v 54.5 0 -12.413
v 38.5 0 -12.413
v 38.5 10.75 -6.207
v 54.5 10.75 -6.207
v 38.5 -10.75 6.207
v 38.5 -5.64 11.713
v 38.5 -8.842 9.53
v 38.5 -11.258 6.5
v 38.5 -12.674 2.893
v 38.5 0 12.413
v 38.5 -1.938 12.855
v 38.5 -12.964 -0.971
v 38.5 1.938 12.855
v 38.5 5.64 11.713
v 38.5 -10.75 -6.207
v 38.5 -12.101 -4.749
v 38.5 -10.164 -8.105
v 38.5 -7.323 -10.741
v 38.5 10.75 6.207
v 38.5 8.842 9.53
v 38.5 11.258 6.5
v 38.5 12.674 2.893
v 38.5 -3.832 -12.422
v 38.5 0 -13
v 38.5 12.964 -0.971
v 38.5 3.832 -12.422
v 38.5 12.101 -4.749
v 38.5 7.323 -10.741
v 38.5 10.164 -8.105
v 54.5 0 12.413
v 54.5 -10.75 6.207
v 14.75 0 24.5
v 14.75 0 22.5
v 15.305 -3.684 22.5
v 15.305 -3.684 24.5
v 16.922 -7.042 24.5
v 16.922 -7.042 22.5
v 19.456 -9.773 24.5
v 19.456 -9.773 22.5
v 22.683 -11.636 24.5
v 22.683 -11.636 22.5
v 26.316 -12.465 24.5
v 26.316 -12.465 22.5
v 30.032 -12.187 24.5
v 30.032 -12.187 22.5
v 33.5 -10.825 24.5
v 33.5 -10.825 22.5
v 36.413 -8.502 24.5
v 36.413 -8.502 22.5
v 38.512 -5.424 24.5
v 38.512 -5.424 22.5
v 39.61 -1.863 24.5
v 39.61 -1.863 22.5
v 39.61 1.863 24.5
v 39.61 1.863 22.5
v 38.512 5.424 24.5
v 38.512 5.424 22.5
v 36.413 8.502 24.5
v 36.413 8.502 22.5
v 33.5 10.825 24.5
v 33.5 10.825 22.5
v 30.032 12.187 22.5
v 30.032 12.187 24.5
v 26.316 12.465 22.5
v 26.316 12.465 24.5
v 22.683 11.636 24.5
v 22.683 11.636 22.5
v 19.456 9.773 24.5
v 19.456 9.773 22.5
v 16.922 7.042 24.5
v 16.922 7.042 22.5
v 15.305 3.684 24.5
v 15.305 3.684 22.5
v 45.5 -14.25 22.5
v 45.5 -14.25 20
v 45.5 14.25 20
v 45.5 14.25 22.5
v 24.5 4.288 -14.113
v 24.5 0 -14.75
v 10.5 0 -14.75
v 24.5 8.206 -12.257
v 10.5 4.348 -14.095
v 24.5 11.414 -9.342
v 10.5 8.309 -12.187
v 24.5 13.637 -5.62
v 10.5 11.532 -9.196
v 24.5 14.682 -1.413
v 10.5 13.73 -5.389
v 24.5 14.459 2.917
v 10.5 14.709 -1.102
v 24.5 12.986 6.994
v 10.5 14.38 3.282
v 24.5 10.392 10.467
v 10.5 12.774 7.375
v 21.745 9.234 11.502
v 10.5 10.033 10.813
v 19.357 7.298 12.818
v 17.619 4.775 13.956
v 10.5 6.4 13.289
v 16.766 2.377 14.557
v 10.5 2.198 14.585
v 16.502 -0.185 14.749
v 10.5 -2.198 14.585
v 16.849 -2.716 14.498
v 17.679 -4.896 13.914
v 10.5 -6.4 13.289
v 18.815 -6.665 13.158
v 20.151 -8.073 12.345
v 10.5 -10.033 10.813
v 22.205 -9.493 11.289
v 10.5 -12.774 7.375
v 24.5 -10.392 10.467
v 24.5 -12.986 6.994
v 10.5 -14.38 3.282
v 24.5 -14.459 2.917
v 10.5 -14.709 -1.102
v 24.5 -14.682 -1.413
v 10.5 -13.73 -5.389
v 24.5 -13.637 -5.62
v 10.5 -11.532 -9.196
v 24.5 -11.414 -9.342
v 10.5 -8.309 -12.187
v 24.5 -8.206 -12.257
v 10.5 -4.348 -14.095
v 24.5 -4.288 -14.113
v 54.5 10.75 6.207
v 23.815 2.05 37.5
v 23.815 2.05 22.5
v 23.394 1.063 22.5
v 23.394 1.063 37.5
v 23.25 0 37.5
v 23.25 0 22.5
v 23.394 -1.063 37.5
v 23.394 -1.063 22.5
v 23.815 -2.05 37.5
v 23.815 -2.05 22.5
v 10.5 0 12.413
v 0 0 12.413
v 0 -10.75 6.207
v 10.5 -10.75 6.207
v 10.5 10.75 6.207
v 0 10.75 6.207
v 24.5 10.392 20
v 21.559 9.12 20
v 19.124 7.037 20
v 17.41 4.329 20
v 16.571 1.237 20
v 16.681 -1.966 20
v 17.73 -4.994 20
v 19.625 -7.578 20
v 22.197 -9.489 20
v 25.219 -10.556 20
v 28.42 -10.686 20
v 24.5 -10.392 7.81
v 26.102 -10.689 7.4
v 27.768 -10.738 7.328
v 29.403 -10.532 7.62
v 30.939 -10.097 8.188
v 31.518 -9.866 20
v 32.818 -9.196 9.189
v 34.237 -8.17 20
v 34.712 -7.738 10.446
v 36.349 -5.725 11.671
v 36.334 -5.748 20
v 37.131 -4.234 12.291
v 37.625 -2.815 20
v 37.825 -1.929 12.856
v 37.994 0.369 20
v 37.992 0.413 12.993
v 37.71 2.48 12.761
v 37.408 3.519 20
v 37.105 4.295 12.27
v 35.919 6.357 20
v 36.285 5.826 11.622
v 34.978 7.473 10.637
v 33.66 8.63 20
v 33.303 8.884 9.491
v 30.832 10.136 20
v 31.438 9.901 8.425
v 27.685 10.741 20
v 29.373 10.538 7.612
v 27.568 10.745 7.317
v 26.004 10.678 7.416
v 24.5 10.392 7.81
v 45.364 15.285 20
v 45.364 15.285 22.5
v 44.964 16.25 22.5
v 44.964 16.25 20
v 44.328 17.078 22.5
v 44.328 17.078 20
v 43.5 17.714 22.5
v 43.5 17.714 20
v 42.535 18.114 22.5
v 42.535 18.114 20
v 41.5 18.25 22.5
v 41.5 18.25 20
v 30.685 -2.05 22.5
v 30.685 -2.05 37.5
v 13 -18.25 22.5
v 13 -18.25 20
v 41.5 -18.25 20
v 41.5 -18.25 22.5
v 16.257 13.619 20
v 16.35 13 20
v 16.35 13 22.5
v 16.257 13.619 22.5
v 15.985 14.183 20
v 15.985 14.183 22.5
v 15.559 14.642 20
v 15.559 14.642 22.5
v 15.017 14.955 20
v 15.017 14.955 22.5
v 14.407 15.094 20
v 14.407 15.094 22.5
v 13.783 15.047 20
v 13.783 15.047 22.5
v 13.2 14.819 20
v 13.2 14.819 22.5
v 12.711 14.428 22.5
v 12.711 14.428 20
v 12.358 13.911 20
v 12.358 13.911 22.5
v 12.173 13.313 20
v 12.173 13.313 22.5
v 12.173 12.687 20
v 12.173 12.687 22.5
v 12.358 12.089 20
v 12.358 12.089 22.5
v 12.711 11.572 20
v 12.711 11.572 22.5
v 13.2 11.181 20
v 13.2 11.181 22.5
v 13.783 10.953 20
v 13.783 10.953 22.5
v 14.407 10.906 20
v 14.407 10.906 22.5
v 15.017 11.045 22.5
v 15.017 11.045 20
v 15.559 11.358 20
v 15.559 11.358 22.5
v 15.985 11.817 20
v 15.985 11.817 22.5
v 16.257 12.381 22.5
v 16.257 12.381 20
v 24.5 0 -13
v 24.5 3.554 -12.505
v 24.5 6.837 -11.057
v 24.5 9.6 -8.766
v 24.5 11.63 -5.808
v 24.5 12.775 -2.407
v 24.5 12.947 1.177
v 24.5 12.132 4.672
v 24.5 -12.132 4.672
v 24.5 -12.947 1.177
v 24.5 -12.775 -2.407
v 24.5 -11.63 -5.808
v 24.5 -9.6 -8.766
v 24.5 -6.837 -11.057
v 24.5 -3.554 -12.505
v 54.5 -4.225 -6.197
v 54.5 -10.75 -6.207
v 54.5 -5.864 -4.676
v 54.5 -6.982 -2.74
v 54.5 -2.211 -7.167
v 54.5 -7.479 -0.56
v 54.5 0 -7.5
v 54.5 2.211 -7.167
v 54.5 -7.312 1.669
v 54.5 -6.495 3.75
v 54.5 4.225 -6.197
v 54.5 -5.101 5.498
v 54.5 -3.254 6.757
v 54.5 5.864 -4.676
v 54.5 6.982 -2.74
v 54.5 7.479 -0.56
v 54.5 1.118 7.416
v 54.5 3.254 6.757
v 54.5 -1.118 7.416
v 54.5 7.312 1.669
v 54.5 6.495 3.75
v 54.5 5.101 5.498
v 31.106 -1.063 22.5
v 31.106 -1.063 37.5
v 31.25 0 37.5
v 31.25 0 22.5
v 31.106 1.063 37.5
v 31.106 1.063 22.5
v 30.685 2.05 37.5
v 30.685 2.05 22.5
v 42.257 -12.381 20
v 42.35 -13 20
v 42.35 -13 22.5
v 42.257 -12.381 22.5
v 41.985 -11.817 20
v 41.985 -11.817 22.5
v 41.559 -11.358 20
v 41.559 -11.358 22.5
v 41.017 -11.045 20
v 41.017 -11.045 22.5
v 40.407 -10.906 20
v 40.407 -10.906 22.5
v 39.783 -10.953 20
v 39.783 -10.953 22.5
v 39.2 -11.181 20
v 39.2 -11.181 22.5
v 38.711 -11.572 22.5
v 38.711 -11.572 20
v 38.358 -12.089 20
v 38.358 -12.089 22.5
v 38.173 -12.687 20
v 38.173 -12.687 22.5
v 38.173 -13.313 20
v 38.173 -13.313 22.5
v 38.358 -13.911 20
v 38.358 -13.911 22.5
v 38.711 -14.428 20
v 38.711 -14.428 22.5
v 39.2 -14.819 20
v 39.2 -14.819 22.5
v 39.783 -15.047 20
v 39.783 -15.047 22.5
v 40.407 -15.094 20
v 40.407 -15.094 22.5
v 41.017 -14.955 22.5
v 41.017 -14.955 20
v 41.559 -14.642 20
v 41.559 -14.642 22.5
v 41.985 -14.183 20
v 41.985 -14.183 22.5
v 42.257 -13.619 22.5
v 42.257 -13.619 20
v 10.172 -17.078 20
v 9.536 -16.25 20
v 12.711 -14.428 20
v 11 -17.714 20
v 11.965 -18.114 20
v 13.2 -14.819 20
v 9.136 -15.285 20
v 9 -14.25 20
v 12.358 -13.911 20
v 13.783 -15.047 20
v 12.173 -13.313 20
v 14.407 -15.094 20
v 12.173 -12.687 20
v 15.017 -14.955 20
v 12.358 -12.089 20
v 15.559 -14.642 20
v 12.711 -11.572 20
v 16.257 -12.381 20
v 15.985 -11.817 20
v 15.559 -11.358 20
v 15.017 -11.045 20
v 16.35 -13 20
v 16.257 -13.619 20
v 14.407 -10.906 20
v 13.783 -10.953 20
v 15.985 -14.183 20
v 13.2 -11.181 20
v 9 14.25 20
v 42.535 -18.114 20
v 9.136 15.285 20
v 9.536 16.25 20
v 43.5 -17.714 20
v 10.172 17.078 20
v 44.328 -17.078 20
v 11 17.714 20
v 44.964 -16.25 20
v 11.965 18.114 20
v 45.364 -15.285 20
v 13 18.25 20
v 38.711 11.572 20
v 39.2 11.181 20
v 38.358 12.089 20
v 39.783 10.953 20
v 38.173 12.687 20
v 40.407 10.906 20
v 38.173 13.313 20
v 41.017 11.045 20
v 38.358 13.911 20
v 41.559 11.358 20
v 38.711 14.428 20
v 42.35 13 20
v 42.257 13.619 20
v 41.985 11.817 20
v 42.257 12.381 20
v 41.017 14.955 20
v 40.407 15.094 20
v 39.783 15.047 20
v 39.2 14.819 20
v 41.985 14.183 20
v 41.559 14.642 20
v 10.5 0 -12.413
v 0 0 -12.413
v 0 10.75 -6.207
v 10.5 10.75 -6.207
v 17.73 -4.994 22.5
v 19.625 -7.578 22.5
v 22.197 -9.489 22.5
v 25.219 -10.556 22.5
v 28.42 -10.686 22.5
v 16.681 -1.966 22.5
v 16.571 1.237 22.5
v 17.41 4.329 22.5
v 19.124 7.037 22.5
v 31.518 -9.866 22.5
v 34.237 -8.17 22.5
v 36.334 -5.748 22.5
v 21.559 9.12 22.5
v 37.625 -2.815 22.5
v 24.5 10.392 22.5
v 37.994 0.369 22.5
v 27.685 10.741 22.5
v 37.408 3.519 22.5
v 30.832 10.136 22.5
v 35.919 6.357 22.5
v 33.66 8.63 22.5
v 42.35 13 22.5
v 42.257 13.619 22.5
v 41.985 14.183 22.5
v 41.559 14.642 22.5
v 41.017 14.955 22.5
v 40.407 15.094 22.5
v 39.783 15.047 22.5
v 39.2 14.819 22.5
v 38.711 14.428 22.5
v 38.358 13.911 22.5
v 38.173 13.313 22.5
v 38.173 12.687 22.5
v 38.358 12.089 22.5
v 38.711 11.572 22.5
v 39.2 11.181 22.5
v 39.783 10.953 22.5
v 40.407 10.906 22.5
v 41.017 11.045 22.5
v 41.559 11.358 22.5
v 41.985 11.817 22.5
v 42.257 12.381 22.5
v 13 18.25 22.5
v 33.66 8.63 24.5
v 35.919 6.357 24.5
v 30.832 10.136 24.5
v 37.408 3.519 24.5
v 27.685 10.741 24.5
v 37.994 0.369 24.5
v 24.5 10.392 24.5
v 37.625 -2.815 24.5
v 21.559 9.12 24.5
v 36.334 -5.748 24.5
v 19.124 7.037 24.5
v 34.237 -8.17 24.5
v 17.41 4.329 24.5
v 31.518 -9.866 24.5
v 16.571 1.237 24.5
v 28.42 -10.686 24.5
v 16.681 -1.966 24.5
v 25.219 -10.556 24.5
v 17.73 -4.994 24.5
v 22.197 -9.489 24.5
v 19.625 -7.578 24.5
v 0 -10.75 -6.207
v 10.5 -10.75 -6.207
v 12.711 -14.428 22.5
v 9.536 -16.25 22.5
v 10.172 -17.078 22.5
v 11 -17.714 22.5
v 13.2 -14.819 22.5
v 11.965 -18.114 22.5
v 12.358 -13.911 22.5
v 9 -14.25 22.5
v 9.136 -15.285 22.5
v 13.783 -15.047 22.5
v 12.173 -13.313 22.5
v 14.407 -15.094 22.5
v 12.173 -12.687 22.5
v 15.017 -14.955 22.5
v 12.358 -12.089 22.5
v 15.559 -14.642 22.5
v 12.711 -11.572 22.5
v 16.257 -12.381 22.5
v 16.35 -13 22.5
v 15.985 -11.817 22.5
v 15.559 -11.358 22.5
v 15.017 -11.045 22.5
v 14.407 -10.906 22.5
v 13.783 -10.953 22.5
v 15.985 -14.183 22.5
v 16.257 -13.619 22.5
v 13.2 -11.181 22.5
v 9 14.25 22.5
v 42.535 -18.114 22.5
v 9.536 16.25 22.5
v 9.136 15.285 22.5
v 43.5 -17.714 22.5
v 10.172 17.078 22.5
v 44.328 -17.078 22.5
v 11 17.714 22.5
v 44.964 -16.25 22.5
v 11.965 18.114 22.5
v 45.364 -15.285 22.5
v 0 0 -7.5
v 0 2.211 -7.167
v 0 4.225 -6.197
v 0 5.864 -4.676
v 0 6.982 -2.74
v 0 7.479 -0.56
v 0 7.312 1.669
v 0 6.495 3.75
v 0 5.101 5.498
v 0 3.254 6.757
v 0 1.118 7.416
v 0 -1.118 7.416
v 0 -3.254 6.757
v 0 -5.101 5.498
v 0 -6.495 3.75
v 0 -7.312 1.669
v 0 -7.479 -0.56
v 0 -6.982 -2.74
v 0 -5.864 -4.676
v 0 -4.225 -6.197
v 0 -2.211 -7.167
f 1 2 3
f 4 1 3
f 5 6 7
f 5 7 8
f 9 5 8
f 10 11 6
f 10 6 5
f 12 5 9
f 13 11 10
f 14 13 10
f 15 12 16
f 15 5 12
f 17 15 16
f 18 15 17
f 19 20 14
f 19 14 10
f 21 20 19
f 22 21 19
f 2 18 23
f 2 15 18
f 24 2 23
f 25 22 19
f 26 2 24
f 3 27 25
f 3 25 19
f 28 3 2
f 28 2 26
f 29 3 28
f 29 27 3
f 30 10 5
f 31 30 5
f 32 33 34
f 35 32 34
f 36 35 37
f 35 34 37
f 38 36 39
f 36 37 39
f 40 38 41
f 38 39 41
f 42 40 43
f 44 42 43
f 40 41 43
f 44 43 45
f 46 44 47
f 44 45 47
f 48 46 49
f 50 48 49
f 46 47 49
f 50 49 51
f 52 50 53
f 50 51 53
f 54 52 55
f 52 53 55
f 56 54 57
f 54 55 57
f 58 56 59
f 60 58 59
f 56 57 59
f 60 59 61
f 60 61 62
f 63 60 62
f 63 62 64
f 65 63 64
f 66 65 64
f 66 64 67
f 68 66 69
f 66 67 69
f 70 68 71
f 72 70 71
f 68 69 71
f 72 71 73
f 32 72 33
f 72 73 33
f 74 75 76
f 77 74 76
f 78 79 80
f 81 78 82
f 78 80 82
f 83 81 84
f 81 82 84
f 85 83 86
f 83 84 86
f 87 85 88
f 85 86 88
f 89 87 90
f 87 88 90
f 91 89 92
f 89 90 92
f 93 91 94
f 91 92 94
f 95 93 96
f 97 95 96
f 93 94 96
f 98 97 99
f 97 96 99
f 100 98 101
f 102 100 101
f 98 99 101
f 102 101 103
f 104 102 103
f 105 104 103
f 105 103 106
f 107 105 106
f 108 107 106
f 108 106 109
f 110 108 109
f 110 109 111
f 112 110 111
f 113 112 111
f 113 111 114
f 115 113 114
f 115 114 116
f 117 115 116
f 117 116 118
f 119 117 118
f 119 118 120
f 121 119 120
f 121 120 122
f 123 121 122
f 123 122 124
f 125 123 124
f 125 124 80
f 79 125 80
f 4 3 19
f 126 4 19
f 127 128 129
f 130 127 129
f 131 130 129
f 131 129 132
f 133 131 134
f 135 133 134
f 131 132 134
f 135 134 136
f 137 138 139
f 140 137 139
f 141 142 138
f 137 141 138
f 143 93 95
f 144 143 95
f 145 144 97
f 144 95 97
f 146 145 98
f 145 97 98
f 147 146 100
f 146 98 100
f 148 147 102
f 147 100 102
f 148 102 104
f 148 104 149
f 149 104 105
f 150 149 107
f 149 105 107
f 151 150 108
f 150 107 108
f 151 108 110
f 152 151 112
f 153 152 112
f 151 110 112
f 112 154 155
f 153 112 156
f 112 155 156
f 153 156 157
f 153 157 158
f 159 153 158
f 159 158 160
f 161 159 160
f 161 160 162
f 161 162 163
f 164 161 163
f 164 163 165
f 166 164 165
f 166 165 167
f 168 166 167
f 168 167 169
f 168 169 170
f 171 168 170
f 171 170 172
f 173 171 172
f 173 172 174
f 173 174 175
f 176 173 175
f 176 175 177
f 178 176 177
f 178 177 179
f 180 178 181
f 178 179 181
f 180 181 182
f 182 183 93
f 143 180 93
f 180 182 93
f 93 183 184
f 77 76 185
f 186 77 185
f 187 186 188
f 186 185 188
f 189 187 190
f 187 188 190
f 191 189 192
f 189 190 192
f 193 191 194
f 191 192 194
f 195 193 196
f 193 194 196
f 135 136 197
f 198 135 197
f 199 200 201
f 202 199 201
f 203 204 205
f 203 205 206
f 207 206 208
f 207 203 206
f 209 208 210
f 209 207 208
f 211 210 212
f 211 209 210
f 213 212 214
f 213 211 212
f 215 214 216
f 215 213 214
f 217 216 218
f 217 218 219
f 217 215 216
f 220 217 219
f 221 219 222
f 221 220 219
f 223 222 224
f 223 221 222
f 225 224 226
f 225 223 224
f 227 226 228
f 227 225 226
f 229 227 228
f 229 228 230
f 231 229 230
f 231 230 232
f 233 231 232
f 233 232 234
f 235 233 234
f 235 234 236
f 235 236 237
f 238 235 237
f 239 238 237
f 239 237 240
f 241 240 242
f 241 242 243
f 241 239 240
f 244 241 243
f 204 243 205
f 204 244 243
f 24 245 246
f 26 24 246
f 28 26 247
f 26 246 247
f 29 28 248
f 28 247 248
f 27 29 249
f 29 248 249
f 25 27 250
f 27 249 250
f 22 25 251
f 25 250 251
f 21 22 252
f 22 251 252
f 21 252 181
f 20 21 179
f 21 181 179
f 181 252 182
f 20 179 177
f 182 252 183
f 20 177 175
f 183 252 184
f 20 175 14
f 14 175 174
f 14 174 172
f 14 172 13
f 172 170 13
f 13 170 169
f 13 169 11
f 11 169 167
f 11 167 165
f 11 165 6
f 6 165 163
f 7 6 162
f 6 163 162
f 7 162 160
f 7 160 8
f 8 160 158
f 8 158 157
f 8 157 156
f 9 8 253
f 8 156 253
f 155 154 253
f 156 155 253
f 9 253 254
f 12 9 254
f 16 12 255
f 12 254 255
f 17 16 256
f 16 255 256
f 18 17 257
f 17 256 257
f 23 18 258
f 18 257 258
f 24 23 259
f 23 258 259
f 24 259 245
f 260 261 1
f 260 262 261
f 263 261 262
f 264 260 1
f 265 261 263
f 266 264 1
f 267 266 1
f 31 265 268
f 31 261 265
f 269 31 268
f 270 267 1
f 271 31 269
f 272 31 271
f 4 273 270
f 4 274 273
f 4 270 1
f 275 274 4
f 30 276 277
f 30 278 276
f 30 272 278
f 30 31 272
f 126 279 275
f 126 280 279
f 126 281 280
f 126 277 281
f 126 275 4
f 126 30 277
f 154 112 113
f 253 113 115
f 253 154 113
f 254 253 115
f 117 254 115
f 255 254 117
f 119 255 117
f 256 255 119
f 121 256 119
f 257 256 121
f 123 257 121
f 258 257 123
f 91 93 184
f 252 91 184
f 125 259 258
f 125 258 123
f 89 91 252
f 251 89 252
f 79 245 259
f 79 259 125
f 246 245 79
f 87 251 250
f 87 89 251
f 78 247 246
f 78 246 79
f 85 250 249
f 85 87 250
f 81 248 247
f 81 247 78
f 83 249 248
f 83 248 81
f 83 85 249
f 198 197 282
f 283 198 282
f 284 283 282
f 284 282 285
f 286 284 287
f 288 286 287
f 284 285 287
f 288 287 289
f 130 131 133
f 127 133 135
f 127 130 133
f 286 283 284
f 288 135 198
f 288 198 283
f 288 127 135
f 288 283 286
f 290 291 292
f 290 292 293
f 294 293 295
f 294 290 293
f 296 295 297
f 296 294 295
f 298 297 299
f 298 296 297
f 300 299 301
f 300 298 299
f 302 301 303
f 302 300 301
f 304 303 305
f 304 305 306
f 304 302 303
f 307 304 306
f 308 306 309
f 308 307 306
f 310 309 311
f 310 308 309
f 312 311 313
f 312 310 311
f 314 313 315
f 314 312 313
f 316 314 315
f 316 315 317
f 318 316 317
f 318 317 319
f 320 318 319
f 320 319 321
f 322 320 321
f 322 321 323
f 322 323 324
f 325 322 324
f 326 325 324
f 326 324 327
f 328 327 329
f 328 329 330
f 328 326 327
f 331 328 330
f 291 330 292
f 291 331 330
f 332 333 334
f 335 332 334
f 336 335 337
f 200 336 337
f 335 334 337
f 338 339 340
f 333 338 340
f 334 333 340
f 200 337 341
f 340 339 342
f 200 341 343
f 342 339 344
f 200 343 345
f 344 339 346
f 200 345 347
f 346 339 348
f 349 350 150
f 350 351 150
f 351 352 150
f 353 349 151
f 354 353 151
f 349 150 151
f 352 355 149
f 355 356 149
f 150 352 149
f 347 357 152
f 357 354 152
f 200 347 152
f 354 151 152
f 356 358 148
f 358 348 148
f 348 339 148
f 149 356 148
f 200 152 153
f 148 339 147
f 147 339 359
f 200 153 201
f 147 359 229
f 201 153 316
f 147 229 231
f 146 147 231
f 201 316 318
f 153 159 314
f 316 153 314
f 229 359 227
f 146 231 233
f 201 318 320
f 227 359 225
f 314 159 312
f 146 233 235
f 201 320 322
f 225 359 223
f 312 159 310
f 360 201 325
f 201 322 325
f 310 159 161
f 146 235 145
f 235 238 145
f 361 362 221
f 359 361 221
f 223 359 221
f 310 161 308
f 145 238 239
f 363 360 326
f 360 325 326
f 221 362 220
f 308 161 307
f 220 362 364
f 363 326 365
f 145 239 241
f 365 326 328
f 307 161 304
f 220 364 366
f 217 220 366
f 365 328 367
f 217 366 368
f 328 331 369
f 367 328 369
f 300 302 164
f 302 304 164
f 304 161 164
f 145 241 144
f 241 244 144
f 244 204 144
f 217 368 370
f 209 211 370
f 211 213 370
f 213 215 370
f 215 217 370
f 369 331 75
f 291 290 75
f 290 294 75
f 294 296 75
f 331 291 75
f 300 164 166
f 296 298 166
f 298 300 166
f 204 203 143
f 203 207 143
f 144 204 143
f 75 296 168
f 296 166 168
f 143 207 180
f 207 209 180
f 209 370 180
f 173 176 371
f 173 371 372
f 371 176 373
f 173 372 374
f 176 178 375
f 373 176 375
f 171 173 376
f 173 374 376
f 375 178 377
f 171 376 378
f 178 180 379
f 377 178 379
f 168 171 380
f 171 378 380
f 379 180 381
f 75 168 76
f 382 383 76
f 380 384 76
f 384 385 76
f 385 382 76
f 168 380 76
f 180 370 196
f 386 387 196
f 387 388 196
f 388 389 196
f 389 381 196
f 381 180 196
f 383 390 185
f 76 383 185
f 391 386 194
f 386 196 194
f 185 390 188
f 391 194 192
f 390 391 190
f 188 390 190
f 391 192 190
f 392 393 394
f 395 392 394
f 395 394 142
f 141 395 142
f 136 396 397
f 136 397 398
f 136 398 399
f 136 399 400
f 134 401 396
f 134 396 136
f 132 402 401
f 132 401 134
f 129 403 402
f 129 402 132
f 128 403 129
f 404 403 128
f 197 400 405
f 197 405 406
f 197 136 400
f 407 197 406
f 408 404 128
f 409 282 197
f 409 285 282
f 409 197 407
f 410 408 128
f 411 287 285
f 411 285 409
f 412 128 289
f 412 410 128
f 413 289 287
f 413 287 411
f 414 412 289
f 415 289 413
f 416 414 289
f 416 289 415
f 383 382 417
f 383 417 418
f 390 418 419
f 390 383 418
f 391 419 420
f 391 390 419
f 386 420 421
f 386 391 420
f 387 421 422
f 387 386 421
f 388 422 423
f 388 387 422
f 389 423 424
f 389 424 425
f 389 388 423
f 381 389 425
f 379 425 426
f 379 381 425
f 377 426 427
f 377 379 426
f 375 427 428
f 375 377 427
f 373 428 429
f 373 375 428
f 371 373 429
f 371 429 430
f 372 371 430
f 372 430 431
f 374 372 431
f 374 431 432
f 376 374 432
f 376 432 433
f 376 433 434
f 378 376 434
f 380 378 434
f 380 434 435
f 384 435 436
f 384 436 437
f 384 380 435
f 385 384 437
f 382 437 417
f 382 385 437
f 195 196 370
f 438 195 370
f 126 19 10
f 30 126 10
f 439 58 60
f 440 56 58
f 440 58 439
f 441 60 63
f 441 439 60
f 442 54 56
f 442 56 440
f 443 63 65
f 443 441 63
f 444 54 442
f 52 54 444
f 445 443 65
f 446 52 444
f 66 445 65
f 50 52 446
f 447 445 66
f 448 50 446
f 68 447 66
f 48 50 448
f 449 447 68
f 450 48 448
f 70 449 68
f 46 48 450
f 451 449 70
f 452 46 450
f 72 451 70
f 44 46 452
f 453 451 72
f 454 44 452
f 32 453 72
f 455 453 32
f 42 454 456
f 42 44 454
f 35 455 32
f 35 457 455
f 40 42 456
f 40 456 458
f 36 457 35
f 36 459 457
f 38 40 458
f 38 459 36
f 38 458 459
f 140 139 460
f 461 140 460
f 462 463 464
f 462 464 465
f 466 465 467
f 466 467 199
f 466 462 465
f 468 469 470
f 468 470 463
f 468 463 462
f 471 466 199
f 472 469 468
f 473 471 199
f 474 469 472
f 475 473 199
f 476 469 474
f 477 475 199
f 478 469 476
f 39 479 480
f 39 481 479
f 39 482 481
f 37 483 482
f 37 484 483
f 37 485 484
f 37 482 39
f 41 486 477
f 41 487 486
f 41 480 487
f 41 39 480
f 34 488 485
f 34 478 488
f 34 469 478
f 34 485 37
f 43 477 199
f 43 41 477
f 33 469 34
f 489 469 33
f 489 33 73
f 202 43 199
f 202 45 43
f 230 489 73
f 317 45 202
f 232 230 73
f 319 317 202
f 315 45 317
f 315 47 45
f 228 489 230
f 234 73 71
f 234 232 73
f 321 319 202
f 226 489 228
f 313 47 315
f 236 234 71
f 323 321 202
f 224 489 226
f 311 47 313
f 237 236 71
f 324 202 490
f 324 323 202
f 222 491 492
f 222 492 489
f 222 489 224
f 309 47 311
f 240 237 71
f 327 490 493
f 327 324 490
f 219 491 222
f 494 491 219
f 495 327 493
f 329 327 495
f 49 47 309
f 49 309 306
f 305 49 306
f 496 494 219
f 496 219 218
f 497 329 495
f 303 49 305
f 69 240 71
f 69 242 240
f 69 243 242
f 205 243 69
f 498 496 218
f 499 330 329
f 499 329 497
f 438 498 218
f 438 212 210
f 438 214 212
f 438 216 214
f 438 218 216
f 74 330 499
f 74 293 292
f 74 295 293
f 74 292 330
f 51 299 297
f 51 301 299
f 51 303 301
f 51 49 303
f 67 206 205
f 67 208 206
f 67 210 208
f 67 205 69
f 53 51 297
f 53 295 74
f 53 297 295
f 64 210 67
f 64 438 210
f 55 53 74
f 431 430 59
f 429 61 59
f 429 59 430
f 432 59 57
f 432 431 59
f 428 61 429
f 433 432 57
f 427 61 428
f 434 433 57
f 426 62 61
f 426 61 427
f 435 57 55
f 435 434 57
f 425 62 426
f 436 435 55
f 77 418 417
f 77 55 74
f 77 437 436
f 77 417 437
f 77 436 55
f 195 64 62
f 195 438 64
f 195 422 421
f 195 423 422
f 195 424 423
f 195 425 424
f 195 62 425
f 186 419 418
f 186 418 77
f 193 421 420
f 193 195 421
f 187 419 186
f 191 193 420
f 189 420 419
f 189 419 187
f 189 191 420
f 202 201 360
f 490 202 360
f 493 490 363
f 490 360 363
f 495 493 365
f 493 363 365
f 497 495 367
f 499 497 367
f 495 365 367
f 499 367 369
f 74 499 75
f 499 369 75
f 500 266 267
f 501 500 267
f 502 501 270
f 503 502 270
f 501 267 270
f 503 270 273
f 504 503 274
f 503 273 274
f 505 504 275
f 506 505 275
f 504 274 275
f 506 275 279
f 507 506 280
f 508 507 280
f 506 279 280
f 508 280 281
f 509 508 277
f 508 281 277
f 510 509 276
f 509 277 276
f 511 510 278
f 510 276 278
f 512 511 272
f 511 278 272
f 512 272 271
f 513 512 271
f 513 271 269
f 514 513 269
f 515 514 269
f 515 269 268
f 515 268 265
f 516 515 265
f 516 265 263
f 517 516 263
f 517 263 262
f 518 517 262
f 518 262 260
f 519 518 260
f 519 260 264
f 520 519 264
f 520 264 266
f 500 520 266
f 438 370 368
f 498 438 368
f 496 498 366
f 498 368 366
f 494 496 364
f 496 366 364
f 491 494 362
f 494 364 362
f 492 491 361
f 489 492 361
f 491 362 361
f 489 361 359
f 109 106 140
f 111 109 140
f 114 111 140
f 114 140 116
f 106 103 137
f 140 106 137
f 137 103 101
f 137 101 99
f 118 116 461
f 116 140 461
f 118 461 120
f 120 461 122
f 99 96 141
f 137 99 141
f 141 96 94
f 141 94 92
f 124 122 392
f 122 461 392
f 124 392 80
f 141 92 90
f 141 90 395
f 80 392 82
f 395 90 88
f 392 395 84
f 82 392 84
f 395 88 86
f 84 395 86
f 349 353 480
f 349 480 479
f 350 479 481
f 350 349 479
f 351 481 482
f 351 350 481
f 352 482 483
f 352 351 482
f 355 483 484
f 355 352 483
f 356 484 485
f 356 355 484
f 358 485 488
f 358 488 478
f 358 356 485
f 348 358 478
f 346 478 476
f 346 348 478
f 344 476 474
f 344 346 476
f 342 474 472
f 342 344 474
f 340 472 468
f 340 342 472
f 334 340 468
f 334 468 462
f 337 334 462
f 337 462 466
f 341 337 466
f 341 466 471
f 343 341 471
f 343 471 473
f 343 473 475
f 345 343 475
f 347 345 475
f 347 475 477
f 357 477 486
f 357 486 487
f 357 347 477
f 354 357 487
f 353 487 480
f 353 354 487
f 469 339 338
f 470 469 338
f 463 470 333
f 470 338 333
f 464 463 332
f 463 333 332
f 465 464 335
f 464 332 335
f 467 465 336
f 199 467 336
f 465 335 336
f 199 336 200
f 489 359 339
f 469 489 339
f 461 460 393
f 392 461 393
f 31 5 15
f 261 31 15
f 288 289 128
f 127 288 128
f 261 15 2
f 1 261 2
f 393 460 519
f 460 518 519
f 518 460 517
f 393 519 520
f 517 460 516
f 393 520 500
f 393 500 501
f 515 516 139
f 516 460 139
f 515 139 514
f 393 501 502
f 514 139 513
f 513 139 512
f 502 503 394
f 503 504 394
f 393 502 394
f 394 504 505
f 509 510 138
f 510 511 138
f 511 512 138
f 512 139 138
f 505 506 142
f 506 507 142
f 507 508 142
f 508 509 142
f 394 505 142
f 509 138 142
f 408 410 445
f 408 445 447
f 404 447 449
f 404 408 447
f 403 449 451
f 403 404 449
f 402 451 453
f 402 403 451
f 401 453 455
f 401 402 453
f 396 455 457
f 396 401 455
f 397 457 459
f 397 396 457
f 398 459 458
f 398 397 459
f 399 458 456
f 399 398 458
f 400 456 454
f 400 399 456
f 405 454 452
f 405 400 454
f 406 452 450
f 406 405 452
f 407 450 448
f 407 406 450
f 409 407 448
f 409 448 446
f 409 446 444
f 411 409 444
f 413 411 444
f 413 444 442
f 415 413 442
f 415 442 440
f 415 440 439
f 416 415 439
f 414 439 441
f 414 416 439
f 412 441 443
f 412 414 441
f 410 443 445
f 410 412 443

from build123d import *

# Parameters (mm, degrees)
BOSS_EXTRUDE1_DEPTH = 10.5
SKETCH2_R           = 14.75
BOSS_EXTRUDE2_DEPTH = 14
SKETCH3_R           = 13
BOSS_EXTRUDE3_DEPTH = 14
BOSS_EXTRUDE4_DEPTH = 16
SKETCH5_R           = 10.75
BOSS_EXTRUDE5_DEPTH = 20
SKETCH6_R           = 2.1
BOSS_EXTRUDE6_DEPTH = 2.5
CUT_EXTRUDE1_REACH  = 63.722
SKETCH7_R           = 7.5
SKETCH8_R           = 12.5
SKETCH8_R_2         = 10.75
BOSS_EXTRUDE7_DEPTH = 2
BOSS_EXTRUDE8_DEPTH = 15


with BuildPart() as part:
    # Sketch1 → Boss-Extrude1 (new body)
    with BuildSketch(Plane.YZ):
        Polygon((0, 12.413030788), (-10.75, 6.206515394), (-10.75, -6.206515394), (0, -12.413030788), (10.75, -6.206515394), (10.75, 6.206515394), align=None)
    extrude(amount=BOSS_EXTRUDE1_DEPTH)

    # Sketch2 → Boss-Extrude2 (add)
    with BuildSketch(Plane.YZ.offset(10.5)):
        with Locations(Location((0, 0, 0), (0, 0, 270))):
            Circle(SKETCH2_R)
    extrude(amount=BOSS_EXTRUDE2_DEPTH)

    # Sketch3 → Boss-Extrude3 (add)
    with BuildSketch(Plane.YZ.offset(24.5)):
        with Locations(Location((0, 0, 0), (0, 0, 270))):
            Circle(SKETCH3_R)
    extrude(amount=BOSS_EXTRUDE3_DEPTH)

    # Sketch4 → Boss-Extrude4 (add)
    with BuildSketch(Plane.YZ.offset(38.5)):
        Polygon((0, 12.413030788), (-10.75, 6.206515394), (-10.75, -6.206515394), (0, -12.413030788), (10.75, -6.206515394), (10.75, 6.206515394), align=None)
    extrude(amount=BOSS_EXTRUDE4_DEPTH)

    # Sketch5 → Boss-Extrude5 (add)
    with BuildSketch(Plane(origin=(0, 0, 0), x_dir=(0, 1, 0), z_dir=(0, 0, 1))):
        with Locations(Location((0, -27.25, 0), (0, 0, 14.821821062))):
            Circle(SKETCH5_R)
    extrude(amount=BOSS_EXTRUDE5_DEPTH)

    # Sketch6 → Boss-Extrude6 (add)
    with BuildSketch(Plane.XY.offset(20)):
        with BuildLine():
            Line((13, -18.25), (41.5, -18.25))
            ThreePointArc((41.5, -18.25), (44.328427125, -17.078427125), (45.5, -14.25))
            Line((45.5, -14.25), (45.5, 14.25))
            ThreePointArc((45.5, 14.25), (44.328427125, 17.078427125), (41.5, 18.25))
            Line((41.5, 18.25), (13, 18.25))
            ThreePointArc((13, 18.25), (10.171572875, 17.078427125), (9, 14.25))
            Line((9, 14.25), (9, -14.25))
            ThreePointArc((9, -14.25), (10.171572875, -17.078427125), (13, -18.25))
        make_face()
        with Locations((14.25, 13)):
            Circle(SKETCH6_R, mode=Mode.SUBTRACT)
        with Locations((40.25, 13)):
            Circle(SKETCH6_R, mode=Mode.SUBTRACT)
        with Locations((40.25, -13)):
            Circle(SKETCH6_R, mode=Mode.SUBTRACT)
        with Locations((14.25, -13)):
            Circle(SKETCH6_R, mode=Mode.SUBTRACT)
    extrude(amount=BOSS_EXTRUDE6_DEPTH)

    # Sketch7 → Cut-Extrude1 (cut, up to next)
    with BuildSketch(Plane.YZ.offset(54.5), mode=Mode.PRIVATE) as cut_extrude1_sk1:
        with Locations(Location((0, 0, 0), (0, 0, 270))):
            Circle(SKETCH7_R)
    cut_extrude1_tool1 = extrude(cut_extrude1_sk1.sketch, amount=-CUT_EXTRUDE1_REACH, mode=Mode.PRIVATE) & part.part
    add(cut_extrude1_tool1.solids().sort_by_distance((54.5, 0, 0))[0], mode=Mode.SUBTRACT)

    # Sketch8 → Boss-Extrude7 (add)
    with BuildSketch(Plane.XY.offset(22.5)):
        with Locations(Location((27.25, 0, 0), (0, 0, 180))):
            Circle(SKETCH8_R)
        with Locations(Location((27.25, 0, 0), (0, 0, 104.821821062))):
            Circle(SKETCH8_R_2, mode=Mode.SUBTRACT)
    extrude(amount=BOSS_EXTRUDE7_DEPTH)

    # Sketch9 → Boss-Extrude8 (add)
    with BuildSketch(Plane.XY.offset(22.5)):
        with BuildLine():
            Line((23.815251101, -2.05), (30.684748899, -2.05))
            ThreePointArc((30.684748899, -2.05), (31.25, 0), (30.684748899, 2.05))
            Line((30.684748899, 2.05), (23.815251101, 2.05))
            ThreePointArc((23.815251101, 2.05), (23.25, 0), (23.815251101, -2.05))
        make_face()
    extrude(amount=BOSS_EXTRUDE8_DEPTH)


solid = part.part
